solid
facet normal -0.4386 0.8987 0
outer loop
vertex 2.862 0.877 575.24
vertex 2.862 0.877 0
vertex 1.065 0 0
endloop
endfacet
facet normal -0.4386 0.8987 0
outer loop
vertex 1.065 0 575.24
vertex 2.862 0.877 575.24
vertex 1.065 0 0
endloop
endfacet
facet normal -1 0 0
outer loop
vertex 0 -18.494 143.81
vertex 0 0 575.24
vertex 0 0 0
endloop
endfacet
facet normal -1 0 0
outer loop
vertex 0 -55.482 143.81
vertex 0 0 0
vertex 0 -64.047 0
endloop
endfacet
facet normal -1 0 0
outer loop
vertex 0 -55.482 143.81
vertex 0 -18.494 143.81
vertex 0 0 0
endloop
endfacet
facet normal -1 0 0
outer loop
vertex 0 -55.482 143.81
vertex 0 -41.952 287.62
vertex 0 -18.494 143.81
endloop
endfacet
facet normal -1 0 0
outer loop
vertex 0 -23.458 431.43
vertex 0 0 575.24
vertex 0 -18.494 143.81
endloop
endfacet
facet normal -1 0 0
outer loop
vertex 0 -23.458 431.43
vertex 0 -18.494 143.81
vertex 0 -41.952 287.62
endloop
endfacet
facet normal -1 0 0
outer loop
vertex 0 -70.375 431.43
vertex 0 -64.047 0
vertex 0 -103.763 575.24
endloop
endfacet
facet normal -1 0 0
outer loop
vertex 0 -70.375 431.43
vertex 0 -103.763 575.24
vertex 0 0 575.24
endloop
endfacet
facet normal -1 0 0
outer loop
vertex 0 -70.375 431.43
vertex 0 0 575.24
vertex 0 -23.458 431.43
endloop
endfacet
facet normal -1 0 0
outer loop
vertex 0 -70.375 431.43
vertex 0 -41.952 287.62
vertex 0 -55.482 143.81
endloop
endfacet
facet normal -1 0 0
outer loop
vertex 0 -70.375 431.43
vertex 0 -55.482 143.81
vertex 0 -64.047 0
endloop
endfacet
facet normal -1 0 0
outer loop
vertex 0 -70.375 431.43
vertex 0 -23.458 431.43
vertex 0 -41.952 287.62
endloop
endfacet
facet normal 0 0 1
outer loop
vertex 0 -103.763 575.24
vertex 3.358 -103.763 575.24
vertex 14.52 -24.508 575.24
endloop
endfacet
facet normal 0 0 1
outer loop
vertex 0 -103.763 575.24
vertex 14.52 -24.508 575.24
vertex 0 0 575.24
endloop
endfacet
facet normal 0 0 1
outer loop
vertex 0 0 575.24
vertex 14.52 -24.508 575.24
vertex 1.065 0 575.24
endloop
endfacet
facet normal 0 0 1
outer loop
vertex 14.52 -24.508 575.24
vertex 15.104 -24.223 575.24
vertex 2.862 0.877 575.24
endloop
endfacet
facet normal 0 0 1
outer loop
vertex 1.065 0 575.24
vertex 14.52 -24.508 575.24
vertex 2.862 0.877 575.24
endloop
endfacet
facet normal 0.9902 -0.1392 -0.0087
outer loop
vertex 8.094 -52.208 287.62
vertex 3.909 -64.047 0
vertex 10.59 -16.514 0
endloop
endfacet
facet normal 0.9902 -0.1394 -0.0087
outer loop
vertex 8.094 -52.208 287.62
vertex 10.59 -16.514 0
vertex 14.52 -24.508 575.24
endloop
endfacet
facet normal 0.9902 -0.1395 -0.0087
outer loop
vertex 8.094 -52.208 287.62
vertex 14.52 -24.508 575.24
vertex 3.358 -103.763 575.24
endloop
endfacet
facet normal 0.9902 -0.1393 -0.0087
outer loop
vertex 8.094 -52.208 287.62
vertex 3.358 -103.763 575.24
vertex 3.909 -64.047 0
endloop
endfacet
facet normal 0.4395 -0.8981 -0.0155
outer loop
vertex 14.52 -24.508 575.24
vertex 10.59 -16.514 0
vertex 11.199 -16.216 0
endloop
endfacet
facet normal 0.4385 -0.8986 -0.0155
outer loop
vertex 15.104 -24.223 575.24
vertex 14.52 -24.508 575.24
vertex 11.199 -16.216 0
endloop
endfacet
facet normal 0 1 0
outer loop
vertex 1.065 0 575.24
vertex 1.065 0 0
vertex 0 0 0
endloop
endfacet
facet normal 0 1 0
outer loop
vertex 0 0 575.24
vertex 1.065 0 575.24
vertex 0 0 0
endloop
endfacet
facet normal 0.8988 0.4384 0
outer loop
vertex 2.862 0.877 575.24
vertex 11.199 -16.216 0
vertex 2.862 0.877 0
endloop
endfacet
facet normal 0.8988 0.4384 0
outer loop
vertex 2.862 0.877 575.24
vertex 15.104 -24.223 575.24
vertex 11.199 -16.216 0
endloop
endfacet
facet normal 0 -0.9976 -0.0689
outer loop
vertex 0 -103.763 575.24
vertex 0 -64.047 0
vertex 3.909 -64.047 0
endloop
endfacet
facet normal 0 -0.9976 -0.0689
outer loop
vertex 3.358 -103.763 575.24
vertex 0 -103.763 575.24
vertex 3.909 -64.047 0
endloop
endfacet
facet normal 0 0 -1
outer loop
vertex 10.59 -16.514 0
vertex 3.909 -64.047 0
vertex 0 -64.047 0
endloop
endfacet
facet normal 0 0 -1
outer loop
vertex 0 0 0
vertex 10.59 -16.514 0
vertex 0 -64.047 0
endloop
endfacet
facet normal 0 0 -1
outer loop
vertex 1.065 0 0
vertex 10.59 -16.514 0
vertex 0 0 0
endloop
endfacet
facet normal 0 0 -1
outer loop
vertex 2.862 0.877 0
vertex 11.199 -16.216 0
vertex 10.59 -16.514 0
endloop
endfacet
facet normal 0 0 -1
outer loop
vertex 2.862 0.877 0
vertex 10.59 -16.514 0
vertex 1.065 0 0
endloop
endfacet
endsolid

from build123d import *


with BuildPart() as part:
    # 草图2 → 放样1 section 0
    with BuildSketch(Plane.XY):
        with BuildLine():
            Line((0, -64.046772386), (3.909209818, -64.046772386))
            Line((3.909209818, -64.046772386), (10.589538167, -16.513766316))
            Line((10.589538167, -16.513766316), (11.199107472, -16.216459501))
            Line((11.199107472, -16.216459501), (2.862195914, 0.876742294))
            Line((2.862195914, 0.876742294), (1.064607822, 0))
            Line((1.064607822, 0), (0, 0))
            Line((0, 0), (0, -64.046772386))
        make_face()
    # 草图4 → 放样1 section 1
    with BuildSketch(Plane.XY.offset(575.24)):
        with BuildLine():
            Line((0, -103.762640376), (3.35790611, -103.762640376))
            Line((3.35790611, -103.762640376), (14.519874435, -24.508173078))
            Line((14.519874435, -24.508173078), (15.104236542, -24.223160634))
            Line((15.104236542, -24.223160634), (2.862195914, 0.876742294))
            Line((2.862195914, 0.876742294), (1.064607822, 0))
            Line((1.064607822, 0), (0, 0))
            Line((0, 0), (0, -103.762640376))
        make_face()
    loft()


solid = part.part
